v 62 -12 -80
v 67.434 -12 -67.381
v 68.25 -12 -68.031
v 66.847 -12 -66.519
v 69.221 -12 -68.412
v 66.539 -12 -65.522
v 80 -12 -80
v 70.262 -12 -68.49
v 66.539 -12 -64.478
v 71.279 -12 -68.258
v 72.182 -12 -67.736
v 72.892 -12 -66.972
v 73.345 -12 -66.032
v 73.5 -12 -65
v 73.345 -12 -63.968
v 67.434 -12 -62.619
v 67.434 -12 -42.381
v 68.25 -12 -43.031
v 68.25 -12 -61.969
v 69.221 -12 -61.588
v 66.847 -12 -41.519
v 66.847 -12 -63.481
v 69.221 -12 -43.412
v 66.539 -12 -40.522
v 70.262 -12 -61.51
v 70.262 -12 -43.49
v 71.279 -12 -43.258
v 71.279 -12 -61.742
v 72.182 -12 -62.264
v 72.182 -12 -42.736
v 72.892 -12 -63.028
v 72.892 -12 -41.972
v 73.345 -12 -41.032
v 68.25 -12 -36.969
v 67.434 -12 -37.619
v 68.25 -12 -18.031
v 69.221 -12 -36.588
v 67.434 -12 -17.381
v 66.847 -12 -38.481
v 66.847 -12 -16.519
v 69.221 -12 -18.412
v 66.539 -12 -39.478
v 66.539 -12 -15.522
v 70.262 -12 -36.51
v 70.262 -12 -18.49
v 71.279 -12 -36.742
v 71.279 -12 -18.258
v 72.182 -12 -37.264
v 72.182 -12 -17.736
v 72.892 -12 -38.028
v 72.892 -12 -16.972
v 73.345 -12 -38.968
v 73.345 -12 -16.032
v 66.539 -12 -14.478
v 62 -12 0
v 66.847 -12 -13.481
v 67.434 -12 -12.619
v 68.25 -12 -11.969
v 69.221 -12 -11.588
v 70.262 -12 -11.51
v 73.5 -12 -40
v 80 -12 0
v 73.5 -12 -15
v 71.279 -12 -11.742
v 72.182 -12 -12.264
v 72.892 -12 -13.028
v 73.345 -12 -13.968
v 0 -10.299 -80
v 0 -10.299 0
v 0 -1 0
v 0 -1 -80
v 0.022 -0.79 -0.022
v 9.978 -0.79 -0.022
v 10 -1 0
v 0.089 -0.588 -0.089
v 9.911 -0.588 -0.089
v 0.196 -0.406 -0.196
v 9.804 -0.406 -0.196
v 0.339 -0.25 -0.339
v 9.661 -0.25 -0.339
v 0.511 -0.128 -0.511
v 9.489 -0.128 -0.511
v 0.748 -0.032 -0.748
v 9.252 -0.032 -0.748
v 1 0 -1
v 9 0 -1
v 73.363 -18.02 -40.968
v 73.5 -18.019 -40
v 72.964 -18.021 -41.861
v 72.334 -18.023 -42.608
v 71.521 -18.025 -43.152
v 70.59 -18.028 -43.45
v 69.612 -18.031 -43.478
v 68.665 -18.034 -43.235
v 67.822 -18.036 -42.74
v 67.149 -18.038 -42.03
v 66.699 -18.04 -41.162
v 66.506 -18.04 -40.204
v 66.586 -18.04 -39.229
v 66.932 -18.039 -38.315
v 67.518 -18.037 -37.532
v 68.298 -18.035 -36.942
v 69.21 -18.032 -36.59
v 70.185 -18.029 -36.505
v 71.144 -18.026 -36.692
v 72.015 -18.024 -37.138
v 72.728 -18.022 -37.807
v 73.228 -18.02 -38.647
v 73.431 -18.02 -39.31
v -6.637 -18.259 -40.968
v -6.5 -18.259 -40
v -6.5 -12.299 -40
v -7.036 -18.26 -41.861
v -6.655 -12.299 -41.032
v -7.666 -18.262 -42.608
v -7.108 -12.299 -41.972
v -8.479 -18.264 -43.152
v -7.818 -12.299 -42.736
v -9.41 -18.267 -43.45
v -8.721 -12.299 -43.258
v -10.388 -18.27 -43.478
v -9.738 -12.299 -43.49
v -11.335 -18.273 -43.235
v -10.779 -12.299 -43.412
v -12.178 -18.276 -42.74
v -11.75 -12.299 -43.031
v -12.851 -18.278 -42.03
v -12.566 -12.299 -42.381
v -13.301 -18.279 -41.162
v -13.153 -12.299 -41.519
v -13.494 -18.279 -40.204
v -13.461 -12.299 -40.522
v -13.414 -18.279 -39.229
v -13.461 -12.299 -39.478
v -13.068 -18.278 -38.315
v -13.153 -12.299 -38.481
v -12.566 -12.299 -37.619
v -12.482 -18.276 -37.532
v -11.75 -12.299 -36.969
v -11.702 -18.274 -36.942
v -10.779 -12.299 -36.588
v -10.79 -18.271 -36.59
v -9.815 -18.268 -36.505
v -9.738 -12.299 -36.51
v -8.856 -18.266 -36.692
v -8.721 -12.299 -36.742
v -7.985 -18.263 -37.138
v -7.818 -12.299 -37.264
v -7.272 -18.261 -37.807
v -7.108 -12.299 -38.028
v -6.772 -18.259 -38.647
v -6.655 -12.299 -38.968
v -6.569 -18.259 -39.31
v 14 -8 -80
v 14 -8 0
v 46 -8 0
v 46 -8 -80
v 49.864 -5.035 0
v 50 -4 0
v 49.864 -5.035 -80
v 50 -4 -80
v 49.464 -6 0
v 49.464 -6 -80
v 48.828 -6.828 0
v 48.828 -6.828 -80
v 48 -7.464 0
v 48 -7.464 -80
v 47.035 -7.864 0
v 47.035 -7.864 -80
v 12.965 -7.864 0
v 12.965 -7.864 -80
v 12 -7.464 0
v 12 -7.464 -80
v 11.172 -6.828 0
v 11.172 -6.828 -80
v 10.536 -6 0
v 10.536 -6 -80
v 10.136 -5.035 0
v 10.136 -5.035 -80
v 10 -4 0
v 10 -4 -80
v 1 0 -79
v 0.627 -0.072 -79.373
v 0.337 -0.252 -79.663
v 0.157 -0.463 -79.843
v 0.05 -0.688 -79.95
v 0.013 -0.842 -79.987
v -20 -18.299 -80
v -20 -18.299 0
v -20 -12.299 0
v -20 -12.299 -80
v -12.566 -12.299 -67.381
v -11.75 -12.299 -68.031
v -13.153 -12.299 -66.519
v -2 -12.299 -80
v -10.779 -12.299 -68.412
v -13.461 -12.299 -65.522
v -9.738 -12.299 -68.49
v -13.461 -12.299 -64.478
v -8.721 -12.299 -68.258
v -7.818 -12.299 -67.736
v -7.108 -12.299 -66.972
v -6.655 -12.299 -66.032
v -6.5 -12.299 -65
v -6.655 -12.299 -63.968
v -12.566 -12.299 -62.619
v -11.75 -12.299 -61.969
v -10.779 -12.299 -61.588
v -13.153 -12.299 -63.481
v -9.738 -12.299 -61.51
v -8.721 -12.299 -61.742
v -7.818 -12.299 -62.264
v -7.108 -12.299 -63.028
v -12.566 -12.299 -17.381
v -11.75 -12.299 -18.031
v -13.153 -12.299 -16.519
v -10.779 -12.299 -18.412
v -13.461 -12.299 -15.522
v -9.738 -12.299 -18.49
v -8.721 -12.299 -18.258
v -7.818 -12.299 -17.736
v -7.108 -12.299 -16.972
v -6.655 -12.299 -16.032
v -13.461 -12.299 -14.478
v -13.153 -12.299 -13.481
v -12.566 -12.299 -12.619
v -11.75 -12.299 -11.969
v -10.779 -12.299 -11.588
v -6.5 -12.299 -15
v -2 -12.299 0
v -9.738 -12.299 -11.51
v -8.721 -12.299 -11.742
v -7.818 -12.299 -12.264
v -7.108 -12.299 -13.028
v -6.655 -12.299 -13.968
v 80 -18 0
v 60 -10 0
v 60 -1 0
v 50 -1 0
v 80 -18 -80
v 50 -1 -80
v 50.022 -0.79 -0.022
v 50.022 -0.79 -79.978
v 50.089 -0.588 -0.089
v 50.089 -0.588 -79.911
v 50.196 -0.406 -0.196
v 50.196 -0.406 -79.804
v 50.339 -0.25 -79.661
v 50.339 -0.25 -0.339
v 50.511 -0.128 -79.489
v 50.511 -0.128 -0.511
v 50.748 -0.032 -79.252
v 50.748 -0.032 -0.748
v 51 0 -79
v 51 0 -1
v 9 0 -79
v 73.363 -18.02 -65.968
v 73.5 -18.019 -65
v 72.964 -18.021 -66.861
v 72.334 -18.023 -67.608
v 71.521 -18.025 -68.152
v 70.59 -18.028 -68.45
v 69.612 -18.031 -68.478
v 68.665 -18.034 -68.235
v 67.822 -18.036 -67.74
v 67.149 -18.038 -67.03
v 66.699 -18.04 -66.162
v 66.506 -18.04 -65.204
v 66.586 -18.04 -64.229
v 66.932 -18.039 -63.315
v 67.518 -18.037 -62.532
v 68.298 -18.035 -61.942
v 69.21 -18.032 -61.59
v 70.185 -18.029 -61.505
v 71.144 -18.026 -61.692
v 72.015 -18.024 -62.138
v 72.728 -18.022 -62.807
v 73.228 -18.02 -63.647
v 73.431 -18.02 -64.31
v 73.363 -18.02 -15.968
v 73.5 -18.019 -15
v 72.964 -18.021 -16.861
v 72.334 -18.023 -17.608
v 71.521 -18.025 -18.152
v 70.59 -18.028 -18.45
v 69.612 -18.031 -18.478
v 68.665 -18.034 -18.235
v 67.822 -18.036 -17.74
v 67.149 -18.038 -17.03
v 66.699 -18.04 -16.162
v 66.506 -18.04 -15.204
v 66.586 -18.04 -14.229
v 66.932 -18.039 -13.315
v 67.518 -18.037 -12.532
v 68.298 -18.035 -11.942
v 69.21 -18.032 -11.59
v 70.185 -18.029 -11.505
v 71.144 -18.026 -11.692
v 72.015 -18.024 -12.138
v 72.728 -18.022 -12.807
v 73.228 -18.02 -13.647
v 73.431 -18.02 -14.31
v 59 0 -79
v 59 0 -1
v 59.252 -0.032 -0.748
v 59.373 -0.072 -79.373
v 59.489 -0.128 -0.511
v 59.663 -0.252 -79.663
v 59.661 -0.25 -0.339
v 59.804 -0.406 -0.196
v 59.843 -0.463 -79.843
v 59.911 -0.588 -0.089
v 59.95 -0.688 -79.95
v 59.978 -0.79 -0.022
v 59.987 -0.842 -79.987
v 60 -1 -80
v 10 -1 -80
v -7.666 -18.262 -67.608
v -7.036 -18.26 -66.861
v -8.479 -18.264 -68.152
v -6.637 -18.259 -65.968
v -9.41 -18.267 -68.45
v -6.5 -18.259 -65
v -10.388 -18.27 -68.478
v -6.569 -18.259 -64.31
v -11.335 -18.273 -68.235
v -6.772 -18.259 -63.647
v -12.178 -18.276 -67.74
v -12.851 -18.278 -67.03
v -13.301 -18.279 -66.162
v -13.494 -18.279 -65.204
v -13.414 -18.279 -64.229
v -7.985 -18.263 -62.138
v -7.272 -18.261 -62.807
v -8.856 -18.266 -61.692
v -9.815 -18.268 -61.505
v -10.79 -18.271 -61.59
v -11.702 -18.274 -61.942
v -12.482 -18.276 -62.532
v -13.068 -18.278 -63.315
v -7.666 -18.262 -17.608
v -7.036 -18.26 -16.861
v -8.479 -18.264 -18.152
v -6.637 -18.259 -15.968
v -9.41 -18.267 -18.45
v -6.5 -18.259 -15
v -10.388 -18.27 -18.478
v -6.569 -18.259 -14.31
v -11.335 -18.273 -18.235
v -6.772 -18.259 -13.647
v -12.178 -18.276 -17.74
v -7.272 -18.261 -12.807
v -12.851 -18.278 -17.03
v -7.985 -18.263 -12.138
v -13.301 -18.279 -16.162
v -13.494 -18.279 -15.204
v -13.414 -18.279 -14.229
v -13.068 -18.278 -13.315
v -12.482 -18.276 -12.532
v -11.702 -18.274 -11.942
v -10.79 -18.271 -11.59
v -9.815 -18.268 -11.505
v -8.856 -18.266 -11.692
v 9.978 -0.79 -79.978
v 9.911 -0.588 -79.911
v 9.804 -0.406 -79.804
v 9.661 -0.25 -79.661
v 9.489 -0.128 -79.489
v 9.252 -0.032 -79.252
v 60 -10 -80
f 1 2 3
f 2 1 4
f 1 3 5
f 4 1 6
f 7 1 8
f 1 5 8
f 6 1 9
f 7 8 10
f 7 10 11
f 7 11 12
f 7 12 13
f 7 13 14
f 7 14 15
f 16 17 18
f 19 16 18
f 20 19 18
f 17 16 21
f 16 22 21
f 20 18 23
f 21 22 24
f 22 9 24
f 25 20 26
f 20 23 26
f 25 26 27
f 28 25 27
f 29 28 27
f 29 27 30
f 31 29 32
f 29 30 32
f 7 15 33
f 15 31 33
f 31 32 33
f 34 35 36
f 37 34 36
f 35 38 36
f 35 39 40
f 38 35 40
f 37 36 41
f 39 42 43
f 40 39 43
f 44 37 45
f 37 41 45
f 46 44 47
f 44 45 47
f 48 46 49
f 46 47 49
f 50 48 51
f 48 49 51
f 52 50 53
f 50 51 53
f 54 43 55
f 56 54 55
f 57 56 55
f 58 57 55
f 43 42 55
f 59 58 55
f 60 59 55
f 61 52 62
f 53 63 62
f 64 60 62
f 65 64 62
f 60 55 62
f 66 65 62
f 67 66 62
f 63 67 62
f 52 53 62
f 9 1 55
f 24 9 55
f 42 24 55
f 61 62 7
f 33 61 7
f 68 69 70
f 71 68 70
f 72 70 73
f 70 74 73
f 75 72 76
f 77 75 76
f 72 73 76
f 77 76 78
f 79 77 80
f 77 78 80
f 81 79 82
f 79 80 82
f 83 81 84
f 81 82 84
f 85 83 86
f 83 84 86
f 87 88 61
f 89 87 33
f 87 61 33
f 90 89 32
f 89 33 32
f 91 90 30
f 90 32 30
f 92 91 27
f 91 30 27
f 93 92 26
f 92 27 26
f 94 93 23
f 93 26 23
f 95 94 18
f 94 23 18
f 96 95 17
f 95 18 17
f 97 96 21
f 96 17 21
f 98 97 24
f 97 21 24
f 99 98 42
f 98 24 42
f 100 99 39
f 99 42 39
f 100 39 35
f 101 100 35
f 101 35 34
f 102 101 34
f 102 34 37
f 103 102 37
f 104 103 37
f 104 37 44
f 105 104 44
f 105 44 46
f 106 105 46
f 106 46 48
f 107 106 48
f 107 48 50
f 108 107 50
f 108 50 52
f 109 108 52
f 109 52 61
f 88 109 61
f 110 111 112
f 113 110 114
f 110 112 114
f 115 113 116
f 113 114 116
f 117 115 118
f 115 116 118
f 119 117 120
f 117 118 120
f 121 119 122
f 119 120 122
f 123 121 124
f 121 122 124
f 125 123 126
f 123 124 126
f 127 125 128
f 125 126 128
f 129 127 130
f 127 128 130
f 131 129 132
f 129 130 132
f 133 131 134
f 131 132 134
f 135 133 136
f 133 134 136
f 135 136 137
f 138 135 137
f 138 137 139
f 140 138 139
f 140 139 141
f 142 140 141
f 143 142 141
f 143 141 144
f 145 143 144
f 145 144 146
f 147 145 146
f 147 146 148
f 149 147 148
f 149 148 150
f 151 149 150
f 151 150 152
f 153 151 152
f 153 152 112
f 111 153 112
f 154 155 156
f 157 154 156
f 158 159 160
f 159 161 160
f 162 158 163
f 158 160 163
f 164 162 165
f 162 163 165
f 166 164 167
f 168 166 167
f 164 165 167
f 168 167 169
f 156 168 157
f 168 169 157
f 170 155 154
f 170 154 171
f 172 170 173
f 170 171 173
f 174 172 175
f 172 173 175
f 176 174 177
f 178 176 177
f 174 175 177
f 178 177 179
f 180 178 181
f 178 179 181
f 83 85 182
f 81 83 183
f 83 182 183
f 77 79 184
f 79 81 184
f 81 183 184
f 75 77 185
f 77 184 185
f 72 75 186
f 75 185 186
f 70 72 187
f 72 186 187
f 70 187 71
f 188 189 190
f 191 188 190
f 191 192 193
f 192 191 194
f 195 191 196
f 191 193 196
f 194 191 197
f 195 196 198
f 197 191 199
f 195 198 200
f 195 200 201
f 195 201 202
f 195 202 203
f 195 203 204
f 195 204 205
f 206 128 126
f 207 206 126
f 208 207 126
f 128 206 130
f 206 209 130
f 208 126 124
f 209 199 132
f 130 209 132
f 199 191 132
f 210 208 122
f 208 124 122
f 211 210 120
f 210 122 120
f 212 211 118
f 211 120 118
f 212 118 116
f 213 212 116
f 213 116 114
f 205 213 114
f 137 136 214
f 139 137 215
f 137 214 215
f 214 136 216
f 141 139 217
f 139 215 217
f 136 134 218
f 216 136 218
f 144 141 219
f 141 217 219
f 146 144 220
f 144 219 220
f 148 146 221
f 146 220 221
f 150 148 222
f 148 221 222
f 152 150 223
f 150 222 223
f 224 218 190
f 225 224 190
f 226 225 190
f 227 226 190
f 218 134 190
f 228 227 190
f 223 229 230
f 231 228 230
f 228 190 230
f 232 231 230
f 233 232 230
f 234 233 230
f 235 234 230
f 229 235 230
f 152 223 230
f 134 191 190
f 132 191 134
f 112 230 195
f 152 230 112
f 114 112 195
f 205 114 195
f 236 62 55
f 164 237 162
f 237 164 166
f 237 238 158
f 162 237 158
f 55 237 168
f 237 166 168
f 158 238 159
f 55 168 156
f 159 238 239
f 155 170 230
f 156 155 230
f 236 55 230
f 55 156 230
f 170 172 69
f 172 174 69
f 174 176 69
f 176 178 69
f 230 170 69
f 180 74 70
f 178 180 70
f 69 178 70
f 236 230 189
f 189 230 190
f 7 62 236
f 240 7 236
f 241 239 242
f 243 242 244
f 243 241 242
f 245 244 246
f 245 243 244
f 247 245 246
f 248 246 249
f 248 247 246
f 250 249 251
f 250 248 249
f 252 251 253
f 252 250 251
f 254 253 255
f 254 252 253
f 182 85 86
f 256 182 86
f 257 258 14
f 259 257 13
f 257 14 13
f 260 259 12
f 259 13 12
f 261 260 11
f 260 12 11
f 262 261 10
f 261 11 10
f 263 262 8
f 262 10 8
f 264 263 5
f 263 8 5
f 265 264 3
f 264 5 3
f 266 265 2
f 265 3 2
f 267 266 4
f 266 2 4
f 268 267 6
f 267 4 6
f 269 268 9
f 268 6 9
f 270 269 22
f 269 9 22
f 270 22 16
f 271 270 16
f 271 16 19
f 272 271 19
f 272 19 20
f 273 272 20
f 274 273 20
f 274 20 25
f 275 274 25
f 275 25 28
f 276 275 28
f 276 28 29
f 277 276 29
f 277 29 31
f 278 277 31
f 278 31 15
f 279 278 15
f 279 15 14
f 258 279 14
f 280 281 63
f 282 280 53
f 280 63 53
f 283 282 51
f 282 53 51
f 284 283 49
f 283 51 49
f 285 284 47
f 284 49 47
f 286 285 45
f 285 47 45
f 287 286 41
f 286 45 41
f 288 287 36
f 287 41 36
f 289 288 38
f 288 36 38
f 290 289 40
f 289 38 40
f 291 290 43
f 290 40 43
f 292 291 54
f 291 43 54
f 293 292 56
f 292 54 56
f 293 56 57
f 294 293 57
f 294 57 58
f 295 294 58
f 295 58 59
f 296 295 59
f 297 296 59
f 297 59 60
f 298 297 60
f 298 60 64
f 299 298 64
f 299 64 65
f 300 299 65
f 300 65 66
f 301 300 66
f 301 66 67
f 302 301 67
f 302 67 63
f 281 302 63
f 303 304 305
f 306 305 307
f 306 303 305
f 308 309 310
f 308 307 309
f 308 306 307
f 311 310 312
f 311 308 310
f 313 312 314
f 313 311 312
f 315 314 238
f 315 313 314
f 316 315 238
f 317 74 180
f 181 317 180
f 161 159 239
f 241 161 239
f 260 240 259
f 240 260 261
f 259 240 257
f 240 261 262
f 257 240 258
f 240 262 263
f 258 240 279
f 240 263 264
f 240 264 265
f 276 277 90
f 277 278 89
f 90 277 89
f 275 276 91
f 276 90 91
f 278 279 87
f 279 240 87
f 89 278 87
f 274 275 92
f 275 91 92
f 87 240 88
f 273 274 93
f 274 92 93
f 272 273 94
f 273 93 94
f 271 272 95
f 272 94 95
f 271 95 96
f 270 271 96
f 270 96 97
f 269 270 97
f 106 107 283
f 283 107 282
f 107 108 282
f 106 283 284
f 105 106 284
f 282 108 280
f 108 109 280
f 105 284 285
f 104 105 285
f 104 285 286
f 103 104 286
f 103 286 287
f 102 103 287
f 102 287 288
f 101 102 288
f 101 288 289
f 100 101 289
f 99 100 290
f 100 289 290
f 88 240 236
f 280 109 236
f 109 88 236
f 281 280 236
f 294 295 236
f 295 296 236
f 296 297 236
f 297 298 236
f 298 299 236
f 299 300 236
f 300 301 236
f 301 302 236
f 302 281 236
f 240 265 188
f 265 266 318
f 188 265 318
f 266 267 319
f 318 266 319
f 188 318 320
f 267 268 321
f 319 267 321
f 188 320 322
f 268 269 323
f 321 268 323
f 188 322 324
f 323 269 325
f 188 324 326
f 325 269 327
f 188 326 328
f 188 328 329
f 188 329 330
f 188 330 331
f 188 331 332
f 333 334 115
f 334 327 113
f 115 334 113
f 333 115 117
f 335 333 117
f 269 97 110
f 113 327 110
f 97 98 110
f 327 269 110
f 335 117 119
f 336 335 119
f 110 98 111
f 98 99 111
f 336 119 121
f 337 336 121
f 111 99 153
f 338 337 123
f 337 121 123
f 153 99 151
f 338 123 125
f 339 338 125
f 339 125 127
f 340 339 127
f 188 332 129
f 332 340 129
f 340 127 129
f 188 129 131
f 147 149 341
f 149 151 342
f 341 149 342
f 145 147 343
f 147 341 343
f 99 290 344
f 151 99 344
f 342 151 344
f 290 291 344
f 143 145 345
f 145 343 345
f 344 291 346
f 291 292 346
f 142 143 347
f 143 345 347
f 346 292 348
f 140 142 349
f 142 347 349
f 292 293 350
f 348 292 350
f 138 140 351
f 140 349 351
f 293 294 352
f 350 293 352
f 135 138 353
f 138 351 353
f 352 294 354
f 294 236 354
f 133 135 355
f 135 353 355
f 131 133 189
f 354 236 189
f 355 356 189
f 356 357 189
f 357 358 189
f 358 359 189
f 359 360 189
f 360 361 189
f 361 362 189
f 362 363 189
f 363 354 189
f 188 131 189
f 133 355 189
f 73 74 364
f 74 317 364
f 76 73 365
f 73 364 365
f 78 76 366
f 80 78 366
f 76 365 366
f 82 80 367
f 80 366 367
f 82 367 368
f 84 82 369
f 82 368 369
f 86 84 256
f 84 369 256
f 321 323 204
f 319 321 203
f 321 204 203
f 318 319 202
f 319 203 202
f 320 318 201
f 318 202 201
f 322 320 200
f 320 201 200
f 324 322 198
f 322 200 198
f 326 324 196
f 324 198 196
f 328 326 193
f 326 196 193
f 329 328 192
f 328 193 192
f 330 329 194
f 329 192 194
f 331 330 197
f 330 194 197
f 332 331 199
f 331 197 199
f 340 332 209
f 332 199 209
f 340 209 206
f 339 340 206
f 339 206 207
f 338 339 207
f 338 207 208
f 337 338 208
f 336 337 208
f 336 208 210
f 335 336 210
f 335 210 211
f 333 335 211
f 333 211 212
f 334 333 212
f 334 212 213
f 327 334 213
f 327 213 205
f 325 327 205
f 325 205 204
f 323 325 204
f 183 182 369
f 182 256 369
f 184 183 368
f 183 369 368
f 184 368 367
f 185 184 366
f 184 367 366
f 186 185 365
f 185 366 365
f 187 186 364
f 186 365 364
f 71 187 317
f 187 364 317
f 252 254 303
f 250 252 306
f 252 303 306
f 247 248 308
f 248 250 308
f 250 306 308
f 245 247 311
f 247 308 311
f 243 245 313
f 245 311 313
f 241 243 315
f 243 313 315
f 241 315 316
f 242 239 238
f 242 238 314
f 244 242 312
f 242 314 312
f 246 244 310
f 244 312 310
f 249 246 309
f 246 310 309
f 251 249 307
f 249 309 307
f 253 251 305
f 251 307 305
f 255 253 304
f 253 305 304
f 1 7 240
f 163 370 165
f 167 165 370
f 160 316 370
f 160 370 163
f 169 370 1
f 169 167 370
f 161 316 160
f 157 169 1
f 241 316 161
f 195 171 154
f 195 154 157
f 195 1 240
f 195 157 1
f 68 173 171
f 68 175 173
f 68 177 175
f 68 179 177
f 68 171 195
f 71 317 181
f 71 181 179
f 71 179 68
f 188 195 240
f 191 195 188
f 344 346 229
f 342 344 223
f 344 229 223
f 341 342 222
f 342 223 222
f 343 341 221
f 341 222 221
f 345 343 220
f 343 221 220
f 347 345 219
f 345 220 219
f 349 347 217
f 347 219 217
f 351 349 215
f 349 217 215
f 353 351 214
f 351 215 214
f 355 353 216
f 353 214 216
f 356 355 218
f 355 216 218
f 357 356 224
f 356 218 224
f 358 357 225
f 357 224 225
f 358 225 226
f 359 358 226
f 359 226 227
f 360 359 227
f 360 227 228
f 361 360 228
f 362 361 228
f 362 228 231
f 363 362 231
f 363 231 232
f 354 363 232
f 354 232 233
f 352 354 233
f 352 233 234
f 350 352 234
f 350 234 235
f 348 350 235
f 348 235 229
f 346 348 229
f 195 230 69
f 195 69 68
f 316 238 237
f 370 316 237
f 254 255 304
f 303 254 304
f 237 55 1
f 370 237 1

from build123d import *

# Parameters (mm, degrees)
BOSS_EXTRU_3_DEPTH      = 80
ESQUISSE17_R            = 3.5
ENL_V_MAT_EXTRU_4_DEPTH = 7
ESQUISSE18_R            = 3.5
ENL_V_MAT_EXTRU_5_DEPTH = 7.298921418
CHANFREIN5_SIZE         = 2
CONG_1_R                = 4
CONG_2_R                = 1


with BuildPart() as part:
    # Esquisse16 → Boss.-Extru.3 (new body)
    with BuildSketch(Plane.XY):
        Polygon((0, 0), (10, 0), (10, -8), (50, -8), (50, 0), (60, 0), (60, -12), (80, -12), (80, -18), (-20, -18.298921418), (-20, -12.298921418), (0, -12.298921418), align=None)
    extrude(amount=-BOSS_EXTRU_3_DEPTH)

    # Esquisse17 → Enlèv. mat.-Extru.4 (cut, through all)
    with BuildSketch(Plane(origin=(0, -12.298921418, 0), x_dir=(1, 0, 0), z_dir=(0, 1, 0))):
        with Locations((-10, 65)):
            Circle(ESQUISSE17_R)
        with Locations((-10, 40)):
            Circle(ESQUISSE17_R)
        with Locations((-10, 15)):
            Circle(ESQUISSE17_R)
    extrude(amount=-ENL_V_MAT_EXTRU_4_DEPTH, mode=Mode.SUBTRACT)

    # Esquisse18 → Enlèv. mat.-Extru.5 (cut, through all)
    with BuildSketch(Plane(origin=(0, -12, 0), x_dir=(1, 0, 0), z_dir=(0, 1, 0))):
        with Locations((70, 65)):
            Circle(ESQUISSE18_R)
        with Locations((70, 40)):
            Circle(ESQUISSE18_R)
        with Locations((70, 15)):
            Circle(ESQUISSE18_R)
    extrude(amount=-ENL_V_MAT_EXTRU_5_DEPTH, mode=Mode.SUBTRACT)

    # Chanfrein5
    chanfrein5_edges = [part.edges().sort_by_distance(p)[0] for p in [
        (60, -12, -40),
        (0, -12.298921418, -40),
    ]]
    chamfer(chanfrein5_edges, length=CHANFREIN5_SIZE)

    # Congé1
    cong_1_edges = [part.edges().sort_by_distance(p)[0] for p in [
        (10, -8, -40),
        (50, -8, -40),
    ]]
    fillet(cong_1_edges, radius=CONG_1_R)

    # Congé2
    cong_2_edges = [part.edges().sort_by_distance(p)[0] for p in [
        (5, 0, 0),
        (55, 0, 0),
        (0, 0, -40),
        (10, 0, -40),
        (50, 0, -40),
        (60, 0, -40),
        (55, 0, -80),
        (5, 0, -80),
    ]]
    fillet(cong_2_edges, radius=CONG_2_R)


solid = part.part
